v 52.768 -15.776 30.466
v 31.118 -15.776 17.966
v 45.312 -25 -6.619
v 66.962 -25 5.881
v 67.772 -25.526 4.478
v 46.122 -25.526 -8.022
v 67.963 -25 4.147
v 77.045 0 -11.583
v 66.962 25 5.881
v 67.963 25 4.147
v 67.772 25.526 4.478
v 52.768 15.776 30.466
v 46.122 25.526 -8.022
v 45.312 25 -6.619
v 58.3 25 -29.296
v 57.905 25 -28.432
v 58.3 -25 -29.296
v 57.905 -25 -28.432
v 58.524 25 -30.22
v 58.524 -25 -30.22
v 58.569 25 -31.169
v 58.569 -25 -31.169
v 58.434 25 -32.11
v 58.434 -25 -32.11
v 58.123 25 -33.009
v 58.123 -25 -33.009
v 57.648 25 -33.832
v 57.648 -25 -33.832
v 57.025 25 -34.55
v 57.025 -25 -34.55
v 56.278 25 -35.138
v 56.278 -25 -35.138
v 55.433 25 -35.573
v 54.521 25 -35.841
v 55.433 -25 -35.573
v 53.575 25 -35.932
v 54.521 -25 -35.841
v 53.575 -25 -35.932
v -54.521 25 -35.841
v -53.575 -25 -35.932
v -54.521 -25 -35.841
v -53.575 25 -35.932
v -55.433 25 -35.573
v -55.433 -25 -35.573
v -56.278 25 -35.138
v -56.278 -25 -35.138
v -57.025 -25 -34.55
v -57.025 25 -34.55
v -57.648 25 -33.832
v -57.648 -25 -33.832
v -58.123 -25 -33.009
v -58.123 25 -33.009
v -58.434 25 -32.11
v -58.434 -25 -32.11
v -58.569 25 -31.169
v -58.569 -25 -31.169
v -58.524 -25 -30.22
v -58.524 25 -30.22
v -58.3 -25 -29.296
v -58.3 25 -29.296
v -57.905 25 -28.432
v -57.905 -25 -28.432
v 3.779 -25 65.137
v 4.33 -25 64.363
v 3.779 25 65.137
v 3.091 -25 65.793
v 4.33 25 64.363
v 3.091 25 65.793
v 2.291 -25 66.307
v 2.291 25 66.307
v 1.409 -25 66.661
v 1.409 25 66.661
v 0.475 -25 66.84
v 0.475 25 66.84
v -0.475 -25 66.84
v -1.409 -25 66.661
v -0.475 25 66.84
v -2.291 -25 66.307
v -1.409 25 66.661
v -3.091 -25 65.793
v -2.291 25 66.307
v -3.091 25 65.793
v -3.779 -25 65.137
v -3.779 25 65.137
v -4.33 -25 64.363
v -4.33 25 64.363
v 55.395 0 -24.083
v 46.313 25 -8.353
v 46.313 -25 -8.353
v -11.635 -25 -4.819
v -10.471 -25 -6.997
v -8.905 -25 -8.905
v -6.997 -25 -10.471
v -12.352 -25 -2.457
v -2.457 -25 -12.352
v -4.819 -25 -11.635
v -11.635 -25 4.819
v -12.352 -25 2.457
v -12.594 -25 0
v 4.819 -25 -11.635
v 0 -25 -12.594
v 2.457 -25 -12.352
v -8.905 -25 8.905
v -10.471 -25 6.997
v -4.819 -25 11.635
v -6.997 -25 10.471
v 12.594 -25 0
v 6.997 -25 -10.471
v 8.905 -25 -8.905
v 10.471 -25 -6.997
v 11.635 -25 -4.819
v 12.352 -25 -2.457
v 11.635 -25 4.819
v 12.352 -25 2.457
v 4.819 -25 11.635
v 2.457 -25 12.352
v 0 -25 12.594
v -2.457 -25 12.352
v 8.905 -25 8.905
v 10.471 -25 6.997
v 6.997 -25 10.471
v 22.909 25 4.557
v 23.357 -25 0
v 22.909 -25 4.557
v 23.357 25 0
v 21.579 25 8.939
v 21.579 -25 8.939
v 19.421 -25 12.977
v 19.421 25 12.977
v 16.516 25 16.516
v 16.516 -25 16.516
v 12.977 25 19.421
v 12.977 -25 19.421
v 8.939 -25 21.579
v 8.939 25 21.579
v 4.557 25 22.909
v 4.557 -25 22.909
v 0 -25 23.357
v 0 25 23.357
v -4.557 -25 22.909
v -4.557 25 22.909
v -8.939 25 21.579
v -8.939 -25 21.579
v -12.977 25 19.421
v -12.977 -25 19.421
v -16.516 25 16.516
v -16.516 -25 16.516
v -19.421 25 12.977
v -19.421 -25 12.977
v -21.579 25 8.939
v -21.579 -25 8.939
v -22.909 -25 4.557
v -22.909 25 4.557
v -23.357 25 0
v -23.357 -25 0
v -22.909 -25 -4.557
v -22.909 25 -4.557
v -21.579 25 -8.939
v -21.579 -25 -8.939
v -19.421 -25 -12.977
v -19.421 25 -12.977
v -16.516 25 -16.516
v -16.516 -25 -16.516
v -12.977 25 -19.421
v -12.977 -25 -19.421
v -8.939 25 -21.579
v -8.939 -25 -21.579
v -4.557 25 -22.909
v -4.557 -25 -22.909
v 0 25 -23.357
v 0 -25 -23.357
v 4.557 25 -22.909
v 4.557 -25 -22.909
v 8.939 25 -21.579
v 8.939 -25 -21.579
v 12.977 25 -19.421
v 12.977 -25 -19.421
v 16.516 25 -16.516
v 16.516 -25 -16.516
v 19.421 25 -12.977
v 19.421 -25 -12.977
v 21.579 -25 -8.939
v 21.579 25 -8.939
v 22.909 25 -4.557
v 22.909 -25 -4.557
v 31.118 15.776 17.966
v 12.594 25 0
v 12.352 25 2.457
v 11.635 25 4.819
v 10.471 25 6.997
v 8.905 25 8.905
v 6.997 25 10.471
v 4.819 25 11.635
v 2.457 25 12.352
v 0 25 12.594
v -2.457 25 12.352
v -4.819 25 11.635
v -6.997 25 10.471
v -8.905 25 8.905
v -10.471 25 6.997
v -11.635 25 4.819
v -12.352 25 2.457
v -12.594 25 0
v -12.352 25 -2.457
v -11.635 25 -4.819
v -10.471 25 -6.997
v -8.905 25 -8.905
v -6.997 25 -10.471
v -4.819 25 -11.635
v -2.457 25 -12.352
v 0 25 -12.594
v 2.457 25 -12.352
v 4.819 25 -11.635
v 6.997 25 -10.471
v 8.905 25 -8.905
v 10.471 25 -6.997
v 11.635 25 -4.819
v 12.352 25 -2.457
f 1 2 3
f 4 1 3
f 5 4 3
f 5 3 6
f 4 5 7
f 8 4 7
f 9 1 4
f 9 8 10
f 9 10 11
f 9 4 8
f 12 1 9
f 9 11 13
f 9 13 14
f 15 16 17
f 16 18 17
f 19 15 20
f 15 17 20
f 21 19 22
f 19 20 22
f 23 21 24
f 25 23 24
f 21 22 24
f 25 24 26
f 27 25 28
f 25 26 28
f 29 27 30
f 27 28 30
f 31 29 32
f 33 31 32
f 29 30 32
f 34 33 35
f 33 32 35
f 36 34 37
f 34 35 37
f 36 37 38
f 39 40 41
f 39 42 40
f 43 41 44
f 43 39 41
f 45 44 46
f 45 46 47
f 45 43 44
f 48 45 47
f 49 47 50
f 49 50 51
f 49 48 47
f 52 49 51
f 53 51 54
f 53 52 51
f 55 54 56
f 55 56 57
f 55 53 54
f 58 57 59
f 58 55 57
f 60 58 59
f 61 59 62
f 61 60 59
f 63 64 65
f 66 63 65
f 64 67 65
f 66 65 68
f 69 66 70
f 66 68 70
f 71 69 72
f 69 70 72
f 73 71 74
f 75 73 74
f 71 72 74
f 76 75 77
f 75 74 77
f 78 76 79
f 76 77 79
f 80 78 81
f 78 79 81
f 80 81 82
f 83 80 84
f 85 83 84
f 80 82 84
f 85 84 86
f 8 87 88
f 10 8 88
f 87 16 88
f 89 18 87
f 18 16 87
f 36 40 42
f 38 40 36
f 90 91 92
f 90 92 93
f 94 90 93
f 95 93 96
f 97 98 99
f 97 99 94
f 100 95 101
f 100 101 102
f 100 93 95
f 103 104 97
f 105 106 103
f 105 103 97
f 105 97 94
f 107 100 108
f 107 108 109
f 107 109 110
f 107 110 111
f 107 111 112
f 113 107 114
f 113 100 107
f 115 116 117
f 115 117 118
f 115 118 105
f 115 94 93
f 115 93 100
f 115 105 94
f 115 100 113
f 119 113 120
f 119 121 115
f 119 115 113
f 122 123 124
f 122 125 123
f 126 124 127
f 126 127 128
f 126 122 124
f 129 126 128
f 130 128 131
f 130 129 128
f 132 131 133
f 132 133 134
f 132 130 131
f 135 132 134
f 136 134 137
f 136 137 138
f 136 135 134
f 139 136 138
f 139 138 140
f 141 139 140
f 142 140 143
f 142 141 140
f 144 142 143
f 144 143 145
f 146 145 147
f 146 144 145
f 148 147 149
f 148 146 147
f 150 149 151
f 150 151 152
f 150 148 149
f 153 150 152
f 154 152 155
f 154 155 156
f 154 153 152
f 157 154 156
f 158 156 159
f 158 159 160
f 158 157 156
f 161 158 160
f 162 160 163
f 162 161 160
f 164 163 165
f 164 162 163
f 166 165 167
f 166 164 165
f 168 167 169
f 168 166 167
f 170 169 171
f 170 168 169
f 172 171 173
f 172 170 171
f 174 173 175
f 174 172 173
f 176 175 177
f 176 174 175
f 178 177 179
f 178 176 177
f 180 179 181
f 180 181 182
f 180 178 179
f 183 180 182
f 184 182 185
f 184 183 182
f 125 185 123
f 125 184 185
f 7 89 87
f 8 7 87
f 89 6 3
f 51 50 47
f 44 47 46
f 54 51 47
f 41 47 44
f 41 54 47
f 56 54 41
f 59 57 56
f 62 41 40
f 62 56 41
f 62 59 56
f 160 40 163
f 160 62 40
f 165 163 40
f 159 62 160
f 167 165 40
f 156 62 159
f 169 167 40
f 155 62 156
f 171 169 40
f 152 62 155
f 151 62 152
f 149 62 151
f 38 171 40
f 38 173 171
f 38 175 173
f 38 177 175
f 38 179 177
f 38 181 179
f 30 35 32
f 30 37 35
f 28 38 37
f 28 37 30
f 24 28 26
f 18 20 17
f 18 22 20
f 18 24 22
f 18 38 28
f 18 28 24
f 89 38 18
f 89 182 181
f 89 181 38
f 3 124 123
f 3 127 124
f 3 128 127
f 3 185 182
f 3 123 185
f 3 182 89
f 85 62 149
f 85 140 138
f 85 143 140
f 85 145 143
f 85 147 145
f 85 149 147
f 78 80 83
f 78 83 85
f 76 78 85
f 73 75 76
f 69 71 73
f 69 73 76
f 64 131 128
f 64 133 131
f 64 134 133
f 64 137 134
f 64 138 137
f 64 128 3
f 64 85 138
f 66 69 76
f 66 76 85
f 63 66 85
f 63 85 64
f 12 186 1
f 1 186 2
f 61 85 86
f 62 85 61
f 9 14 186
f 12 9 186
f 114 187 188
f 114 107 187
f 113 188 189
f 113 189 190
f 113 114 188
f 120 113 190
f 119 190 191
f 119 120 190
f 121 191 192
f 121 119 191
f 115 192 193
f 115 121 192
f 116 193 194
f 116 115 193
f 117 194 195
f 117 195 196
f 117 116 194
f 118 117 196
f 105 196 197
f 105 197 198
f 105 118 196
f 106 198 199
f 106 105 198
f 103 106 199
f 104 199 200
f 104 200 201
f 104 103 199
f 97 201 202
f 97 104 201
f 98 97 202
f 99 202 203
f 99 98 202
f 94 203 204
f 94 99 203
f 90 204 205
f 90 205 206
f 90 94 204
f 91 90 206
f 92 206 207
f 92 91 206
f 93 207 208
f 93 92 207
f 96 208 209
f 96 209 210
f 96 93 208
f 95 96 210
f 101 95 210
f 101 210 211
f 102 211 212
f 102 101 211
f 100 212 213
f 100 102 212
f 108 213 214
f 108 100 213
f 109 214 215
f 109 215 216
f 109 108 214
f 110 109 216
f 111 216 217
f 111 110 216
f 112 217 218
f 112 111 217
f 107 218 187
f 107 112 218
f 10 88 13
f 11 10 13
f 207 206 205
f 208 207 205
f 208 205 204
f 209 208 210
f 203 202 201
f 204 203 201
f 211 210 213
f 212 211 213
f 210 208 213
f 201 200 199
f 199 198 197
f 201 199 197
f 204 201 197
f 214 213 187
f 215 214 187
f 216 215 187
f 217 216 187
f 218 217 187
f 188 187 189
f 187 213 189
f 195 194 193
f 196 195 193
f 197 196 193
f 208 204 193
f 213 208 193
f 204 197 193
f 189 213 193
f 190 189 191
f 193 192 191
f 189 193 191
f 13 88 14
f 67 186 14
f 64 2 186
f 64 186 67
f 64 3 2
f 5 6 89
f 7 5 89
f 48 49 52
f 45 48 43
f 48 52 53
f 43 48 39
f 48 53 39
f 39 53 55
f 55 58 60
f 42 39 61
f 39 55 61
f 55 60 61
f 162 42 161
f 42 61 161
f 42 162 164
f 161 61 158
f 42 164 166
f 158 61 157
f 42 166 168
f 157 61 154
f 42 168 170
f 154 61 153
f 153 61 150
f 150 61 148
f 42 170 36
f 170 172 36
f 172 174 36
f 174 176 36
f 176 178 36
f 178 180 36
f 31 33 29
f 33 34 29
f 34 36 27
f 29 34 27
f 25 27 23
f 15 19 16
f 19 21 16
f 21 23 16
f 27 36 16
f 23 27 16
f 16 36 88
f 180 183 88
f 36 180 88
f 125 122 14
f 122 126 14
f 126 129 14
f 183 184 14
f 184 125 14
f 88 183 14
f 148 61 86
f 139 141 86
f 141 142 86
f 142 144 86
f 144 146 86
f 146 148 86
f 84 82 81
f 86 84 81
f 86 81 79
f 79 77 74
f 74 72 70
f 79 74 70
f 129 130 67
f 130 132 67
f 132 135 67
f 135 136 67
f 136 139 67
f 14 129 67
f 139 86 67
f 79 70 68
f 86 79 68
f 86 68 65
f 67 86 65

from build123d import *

# Parameters (mm, degrees)
F0_R          = 23.3574333424
F1_DEPTH      = 25
F1_DEPTH_BACK = 25
F0_R_2        = 12.5938573021
F3_DEPTH      = 25
F4_R          = 5
F5_R          = 5
F6_R          = 5


with BuildPart() as f1:
    # F0 (on Front) → F1 (new body, two sides)
    with BuildSketch(Plane.XZ) as f1_sk:
        Polygon((-62.2352894936, -35.9315611422), (62.2352894936, -35.9315611422), (0, 71.8631222844), align=None)
        Circle(F0_R, mode=Mode.SUBTRACT)
    extrude(amount=F1_DEPTH)
    extrude(f1_sk.sketch, amount=-F1_DEPTH_BACK)

    # F2 (on face) → F3 (join)
    with BuildSketch(Plane(origin=(31.1176447468, 0, 17.9657805711), x_dir=(0, 1, 0), z_dir=(0.8660254038, 0, 0.5))):
        Polygon((25.5262657143, -30.0079250659), (25, -28.3882457409), (25, -30.3902794884), align=None)
        Polygon((-25, -30.3902794884), (-25, -28.3882457409), (-25.5262657143, -30.0079250659), align=None)
        Polygon((15.7760998173, 0), (-15.7760998173, 0), (-25, -28.3882457409), (-25, -30.3902794884), (0, -48.5538426885), (25, -30.3902794884), (25, -28.3882457409), align=None)
    extrude(amount=F3_DEPTH)

    # F4
    f4_edges = [f1.edges().sort_by_distance(p)[0] for p in [
        (0, 0, 71.863122),
    ]]
    fillet(f4_edges, radius=F4_R)

    # F5
    f5_edges = [f1.edges().sort_by_distance(p)[0] for p in [
        (62.235289, 0, -35.931561),
    ]]
    fillet(f5_edges, radius=F5_R)

    # F6
    f6_edges = [f1.edges().sort_by_distance(p)[0] for p in [
        (-62.235289, 0, -35.931561),
    ]]
    fillet(f6_edges, radius=F6_R)


with BuildPart() as f1b:
    # F0 (on Front) → F1, piece 2 (new body, two sides)
    with BuildSketch(Plane.XZ) as f1_2_sk:
        Circle(F0_R_2)
    extrude(amount=F1_DEPTH)
    extrude(f1_2_sk.sketch, amount=-F1_DEPTH_BACK)


solid = Compound([f1.part, f1b.part])
